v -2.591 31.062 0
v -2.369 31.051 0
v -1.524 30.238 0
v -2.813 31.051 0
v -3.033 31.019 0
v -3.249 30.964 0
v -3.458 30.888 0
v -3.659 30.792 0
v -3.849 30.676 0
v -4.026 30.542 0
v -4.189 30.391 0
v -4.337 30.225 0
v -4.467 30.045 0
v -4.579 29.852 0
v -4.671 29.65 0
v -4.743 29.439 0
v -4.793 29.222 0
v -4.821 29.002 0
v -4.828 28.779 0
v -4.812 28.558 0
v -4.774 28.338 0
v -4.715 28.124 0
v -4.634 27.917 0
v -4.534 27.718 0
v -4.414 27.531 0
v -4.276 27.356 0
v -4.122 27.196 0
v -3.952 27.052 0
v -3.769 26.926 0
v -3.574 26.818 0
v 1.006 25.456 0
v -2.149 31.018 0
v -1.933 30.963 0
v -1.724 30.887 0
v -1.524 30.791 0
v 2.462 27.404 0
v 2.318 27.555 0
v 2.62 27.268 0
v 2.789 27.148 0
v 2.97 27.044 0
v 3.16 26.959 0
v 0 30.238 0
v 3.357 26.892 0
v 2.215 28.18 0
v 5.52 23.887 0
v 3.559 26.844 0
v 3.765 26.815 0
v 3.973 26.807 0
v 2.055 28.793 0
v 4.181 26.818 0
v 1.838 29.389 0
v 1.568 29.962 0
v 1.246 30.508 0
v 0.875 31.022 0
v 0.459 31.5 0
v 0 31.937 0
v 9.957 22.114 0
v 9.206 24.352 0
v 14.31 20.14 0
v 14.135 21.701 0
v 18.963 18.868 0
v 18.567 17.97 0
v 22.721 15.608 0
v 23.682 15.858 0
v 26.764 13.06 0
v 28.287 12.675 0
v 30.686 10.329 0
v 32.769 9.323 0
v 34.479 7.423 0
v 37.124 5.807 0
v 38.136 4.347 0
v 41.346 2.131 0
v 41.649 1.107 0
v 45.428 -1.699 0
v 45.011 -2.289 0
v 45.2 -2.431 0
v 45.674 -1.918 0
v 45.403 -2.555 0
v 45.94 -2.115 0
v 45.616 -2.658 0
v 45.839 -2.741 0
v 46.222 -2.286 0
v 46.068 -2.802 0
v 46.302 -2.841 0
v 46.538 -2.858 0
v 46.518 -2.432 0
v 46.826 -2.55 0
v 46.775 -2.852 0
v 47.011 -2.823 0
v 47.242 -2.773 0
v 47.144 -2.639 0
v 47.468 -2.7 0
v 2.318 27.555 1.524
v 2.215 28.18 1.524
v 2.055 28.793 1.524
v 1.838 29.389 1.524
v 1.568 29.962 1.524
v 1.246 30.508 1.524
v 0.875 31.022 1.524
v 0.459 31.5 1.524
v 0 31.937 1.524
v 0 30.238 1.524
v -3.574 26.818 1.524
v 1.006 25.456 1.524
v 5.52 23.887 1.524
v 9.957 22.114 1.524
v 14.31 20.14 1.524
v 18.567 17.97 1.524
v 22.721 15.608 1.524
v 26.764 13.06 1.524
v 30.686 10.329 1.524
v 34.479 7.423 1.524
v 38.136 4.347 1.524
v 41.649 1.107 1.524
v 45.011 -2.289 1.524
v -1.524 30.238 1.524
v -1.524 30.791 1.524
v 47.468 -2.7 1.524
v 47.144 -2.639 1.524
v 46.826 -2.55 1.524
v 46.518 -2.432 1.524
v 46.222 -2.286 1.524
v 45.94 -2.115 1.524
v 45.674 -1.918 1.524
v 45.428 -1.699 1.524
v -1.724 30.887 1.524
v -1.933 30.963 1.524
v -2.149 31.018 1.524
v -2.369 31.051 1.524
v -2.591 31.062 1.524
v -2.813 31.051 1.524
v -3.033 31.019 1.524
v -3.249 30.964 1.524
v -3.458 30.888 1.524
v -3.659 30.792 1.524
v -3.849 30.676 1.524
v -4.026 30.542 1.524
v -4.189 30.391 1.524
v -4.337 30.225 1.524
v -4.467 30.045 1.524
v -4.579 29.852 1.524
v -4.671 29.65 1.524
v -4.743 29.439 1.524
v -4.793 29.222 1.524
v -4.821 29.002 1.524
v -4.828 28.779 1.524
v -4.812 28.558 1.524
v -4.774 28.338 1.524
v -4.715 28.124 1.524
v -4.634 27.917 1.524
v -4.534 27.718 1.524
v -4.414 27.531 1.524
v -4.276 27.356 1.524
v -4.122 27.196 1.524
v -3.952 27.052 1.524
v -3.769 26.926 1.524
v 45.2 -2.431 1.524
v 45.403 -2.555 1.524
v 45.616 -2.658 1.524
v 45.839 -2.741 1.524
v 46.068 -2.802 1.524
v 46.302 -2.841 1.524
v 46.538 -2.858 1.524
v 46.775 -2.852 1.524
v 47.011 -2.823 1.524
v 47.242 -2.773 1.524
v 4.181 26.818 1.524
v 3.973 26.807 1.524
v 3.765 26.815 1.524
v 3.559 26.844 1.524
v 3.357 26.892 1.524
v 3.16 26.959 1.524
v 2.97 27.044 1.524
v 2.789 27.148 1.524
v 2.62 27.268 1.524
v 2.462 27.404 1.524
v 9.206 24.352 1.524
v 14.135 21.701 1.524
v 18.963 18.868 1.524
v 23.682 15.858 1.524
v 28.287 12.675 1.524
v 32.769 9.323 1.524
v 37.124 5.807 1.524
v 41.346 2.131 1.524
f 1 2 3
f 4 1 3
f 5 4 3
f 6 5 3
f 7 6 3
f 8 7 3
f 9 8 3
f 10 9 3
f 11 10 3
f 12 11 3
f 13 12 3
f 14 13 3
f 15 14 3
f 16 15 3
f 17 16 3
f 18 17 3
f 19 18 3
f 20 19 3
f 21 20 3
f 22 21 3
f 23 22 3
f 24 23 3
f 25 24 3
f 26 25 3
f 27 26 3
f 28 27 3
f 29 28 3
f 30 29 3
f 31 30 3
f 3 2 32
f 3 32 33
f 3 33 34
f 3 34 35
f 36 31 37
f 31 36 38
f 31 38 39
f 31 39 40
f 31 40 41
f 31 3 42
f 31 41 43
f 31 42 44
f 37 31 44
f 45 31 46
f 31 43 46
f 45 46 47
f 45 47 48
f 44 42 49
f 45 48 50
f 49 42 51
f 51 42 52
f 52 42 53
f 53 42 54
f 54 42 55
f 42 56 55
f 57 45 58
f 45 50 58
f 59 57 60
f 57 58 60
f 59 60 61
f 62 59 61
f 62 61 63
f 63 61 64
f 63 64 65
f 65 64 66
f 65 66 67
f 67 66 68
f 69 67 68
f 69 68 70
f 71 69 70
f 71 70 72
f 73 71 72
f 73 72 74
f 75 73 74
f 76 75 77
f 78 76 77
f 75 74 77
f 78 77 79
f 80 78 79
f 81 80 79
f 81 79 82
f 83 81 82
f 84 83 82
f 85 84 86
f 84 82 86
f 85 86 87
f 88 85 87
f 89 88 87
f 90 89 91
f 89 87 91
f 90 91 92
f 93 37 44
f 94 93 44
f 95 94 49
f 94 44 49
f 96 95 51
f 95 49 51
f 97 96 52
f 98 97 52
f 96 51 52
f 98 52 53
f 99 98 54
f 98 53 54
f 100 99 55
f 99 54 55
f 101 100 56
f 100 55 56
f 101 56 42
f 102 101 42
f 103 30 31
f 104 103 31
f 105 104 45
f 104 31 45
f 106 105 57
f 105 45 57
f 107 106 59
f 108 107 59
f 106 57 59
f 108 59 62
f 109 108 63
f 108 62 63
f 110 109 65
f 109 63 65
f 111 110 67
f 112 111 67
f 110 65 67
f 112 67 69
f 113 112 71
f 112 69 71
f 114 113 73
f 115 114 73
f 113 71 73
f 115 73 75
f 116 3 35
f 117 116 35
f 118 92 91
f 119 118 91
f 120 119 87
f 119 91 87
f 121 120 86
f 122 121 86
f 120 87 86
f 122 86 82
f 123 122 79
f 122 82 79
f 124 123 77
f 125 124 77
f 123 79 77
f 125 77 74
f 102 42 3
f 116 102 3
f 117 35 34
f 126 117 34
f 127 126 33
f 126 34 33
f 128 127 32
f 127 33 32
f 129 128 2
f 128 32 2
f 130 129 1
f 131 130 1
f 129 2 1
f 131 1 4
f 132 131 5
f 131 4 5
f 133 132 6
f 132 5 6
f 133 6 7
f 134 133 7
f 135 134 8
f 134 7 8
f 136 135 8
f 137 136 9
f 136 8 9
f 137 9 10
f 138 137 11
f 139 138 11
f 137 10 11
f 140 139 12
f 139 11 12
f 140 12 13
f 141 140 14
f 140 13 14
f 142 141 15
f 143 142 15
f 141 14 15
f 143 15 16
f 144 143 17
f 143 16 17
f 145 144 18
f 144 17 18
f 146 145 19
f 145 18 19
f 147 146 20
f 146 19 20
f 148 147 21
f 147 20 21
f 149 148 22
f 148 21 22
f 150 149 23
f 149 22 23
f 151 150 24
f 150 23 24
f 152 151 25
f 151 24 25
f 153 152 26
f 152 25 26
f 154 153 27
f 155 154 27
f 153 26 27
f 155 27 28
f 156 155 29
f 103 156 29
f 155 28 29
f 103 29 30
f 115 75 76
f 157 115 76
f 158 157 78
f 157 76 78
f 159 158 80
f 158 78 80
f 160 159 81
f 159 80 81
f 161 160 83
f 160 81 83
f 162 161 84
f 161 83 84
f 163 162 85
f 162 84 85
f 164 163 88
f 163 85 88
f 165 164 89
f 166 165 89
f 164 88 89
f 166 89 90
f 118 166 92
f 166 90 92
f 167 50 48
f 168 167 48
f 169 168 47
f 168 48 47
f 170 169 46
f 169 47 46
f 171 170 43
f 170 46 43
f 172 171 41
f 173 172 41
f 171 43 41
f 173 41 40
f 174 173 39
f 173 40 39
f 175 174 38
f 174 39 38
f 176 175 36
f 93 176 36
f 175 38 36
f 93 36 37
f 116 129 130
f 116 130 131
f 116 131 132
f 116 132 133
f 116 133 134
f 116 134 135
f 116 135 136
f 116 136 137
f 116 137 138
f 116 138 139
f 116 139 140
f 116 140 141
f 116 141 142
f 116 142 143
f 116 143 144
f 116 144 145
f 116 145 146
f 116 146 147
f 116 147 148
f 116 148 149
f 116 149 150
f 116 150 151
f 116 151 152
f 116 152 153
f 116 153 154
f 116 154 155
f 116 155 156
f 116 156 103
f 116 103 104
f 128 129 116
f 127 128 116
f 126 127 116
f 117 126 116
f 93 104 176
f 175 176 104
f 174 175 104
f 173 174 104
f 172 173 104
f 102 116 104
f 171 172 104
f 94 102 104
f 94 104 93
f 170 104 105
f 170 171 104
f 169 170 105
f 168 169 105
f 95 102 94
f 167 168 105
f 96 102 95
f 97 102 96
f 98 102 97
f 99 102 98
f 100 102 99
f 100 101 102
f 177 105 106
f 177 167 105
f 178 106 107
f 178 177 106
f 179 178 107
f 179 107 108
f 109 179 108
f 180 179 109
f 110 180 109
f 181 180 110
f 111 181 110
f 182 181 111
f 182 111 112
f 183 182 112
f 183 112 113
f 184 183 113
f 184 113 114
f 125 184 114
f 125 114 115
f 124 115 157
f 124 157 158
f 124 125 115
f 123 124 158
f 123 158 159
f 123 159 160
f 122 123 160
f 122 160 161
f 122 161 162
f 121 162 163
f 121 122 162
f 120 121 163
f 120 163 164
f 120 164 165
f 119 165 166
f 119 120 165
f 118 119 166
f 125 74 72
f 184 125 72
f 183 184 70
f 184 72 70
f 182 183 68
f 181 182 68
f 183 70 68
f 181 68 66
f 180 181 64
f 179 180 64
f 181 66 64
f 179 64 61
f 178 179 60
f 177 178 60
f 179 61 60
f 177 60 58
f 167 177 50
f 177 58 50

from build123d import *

# Parameters (mm, degrees)
BOSS_EXTRUDE1_DEPTH = 1.524


with BuildPart() as part:
    # Sketch1 → Boss-Extrude1 (new body)
    with BuildSketch(Plane.XY):
        with BuildLine():
            Line((0, 30.238088669), (-1.524, 30.238088669))
            Line((-1.524, 30.238088669), (-1.524, 30.790634065))
            ThreePointArc((-1.524, 30.790634065), (-4.57902006, 29.852179907), (-3.574419861, 26.818267876))
            ThreePointArc((-3.574419861, 26.818267876), (22.721404873, 15.60835362), (45.010506388, -2.289370529))
            ThreePointArc((45.010506388, -2.289370529), (46.184159064, -2.824291441), (47.467988652, -2.700264938))
            ThreePointArc((47.467988652, -2.700264938), (46.368179039, -2.362168668), (45.427846615, -1.69909612))
            ThreePointArc((45.427846615, -1.69909612), (25.999332487, 14.287912382), (4.180950484, 26.818267876))
            ThreePointArc((4.180950484, 26.818267876), (3.159648615, 26.95869619), (2.318491113, 27.55470934))
            ThreePointArc((2.318491113, 27.55470934), (1.568114485, 29.962053436), (0, 31.936740157))
            Line((0, 31.936740157), (0, 30.238088669))
        make_face()
    extrude(amount=BOSS_EXTRUDE1_DEPTH)


solid = part.part
